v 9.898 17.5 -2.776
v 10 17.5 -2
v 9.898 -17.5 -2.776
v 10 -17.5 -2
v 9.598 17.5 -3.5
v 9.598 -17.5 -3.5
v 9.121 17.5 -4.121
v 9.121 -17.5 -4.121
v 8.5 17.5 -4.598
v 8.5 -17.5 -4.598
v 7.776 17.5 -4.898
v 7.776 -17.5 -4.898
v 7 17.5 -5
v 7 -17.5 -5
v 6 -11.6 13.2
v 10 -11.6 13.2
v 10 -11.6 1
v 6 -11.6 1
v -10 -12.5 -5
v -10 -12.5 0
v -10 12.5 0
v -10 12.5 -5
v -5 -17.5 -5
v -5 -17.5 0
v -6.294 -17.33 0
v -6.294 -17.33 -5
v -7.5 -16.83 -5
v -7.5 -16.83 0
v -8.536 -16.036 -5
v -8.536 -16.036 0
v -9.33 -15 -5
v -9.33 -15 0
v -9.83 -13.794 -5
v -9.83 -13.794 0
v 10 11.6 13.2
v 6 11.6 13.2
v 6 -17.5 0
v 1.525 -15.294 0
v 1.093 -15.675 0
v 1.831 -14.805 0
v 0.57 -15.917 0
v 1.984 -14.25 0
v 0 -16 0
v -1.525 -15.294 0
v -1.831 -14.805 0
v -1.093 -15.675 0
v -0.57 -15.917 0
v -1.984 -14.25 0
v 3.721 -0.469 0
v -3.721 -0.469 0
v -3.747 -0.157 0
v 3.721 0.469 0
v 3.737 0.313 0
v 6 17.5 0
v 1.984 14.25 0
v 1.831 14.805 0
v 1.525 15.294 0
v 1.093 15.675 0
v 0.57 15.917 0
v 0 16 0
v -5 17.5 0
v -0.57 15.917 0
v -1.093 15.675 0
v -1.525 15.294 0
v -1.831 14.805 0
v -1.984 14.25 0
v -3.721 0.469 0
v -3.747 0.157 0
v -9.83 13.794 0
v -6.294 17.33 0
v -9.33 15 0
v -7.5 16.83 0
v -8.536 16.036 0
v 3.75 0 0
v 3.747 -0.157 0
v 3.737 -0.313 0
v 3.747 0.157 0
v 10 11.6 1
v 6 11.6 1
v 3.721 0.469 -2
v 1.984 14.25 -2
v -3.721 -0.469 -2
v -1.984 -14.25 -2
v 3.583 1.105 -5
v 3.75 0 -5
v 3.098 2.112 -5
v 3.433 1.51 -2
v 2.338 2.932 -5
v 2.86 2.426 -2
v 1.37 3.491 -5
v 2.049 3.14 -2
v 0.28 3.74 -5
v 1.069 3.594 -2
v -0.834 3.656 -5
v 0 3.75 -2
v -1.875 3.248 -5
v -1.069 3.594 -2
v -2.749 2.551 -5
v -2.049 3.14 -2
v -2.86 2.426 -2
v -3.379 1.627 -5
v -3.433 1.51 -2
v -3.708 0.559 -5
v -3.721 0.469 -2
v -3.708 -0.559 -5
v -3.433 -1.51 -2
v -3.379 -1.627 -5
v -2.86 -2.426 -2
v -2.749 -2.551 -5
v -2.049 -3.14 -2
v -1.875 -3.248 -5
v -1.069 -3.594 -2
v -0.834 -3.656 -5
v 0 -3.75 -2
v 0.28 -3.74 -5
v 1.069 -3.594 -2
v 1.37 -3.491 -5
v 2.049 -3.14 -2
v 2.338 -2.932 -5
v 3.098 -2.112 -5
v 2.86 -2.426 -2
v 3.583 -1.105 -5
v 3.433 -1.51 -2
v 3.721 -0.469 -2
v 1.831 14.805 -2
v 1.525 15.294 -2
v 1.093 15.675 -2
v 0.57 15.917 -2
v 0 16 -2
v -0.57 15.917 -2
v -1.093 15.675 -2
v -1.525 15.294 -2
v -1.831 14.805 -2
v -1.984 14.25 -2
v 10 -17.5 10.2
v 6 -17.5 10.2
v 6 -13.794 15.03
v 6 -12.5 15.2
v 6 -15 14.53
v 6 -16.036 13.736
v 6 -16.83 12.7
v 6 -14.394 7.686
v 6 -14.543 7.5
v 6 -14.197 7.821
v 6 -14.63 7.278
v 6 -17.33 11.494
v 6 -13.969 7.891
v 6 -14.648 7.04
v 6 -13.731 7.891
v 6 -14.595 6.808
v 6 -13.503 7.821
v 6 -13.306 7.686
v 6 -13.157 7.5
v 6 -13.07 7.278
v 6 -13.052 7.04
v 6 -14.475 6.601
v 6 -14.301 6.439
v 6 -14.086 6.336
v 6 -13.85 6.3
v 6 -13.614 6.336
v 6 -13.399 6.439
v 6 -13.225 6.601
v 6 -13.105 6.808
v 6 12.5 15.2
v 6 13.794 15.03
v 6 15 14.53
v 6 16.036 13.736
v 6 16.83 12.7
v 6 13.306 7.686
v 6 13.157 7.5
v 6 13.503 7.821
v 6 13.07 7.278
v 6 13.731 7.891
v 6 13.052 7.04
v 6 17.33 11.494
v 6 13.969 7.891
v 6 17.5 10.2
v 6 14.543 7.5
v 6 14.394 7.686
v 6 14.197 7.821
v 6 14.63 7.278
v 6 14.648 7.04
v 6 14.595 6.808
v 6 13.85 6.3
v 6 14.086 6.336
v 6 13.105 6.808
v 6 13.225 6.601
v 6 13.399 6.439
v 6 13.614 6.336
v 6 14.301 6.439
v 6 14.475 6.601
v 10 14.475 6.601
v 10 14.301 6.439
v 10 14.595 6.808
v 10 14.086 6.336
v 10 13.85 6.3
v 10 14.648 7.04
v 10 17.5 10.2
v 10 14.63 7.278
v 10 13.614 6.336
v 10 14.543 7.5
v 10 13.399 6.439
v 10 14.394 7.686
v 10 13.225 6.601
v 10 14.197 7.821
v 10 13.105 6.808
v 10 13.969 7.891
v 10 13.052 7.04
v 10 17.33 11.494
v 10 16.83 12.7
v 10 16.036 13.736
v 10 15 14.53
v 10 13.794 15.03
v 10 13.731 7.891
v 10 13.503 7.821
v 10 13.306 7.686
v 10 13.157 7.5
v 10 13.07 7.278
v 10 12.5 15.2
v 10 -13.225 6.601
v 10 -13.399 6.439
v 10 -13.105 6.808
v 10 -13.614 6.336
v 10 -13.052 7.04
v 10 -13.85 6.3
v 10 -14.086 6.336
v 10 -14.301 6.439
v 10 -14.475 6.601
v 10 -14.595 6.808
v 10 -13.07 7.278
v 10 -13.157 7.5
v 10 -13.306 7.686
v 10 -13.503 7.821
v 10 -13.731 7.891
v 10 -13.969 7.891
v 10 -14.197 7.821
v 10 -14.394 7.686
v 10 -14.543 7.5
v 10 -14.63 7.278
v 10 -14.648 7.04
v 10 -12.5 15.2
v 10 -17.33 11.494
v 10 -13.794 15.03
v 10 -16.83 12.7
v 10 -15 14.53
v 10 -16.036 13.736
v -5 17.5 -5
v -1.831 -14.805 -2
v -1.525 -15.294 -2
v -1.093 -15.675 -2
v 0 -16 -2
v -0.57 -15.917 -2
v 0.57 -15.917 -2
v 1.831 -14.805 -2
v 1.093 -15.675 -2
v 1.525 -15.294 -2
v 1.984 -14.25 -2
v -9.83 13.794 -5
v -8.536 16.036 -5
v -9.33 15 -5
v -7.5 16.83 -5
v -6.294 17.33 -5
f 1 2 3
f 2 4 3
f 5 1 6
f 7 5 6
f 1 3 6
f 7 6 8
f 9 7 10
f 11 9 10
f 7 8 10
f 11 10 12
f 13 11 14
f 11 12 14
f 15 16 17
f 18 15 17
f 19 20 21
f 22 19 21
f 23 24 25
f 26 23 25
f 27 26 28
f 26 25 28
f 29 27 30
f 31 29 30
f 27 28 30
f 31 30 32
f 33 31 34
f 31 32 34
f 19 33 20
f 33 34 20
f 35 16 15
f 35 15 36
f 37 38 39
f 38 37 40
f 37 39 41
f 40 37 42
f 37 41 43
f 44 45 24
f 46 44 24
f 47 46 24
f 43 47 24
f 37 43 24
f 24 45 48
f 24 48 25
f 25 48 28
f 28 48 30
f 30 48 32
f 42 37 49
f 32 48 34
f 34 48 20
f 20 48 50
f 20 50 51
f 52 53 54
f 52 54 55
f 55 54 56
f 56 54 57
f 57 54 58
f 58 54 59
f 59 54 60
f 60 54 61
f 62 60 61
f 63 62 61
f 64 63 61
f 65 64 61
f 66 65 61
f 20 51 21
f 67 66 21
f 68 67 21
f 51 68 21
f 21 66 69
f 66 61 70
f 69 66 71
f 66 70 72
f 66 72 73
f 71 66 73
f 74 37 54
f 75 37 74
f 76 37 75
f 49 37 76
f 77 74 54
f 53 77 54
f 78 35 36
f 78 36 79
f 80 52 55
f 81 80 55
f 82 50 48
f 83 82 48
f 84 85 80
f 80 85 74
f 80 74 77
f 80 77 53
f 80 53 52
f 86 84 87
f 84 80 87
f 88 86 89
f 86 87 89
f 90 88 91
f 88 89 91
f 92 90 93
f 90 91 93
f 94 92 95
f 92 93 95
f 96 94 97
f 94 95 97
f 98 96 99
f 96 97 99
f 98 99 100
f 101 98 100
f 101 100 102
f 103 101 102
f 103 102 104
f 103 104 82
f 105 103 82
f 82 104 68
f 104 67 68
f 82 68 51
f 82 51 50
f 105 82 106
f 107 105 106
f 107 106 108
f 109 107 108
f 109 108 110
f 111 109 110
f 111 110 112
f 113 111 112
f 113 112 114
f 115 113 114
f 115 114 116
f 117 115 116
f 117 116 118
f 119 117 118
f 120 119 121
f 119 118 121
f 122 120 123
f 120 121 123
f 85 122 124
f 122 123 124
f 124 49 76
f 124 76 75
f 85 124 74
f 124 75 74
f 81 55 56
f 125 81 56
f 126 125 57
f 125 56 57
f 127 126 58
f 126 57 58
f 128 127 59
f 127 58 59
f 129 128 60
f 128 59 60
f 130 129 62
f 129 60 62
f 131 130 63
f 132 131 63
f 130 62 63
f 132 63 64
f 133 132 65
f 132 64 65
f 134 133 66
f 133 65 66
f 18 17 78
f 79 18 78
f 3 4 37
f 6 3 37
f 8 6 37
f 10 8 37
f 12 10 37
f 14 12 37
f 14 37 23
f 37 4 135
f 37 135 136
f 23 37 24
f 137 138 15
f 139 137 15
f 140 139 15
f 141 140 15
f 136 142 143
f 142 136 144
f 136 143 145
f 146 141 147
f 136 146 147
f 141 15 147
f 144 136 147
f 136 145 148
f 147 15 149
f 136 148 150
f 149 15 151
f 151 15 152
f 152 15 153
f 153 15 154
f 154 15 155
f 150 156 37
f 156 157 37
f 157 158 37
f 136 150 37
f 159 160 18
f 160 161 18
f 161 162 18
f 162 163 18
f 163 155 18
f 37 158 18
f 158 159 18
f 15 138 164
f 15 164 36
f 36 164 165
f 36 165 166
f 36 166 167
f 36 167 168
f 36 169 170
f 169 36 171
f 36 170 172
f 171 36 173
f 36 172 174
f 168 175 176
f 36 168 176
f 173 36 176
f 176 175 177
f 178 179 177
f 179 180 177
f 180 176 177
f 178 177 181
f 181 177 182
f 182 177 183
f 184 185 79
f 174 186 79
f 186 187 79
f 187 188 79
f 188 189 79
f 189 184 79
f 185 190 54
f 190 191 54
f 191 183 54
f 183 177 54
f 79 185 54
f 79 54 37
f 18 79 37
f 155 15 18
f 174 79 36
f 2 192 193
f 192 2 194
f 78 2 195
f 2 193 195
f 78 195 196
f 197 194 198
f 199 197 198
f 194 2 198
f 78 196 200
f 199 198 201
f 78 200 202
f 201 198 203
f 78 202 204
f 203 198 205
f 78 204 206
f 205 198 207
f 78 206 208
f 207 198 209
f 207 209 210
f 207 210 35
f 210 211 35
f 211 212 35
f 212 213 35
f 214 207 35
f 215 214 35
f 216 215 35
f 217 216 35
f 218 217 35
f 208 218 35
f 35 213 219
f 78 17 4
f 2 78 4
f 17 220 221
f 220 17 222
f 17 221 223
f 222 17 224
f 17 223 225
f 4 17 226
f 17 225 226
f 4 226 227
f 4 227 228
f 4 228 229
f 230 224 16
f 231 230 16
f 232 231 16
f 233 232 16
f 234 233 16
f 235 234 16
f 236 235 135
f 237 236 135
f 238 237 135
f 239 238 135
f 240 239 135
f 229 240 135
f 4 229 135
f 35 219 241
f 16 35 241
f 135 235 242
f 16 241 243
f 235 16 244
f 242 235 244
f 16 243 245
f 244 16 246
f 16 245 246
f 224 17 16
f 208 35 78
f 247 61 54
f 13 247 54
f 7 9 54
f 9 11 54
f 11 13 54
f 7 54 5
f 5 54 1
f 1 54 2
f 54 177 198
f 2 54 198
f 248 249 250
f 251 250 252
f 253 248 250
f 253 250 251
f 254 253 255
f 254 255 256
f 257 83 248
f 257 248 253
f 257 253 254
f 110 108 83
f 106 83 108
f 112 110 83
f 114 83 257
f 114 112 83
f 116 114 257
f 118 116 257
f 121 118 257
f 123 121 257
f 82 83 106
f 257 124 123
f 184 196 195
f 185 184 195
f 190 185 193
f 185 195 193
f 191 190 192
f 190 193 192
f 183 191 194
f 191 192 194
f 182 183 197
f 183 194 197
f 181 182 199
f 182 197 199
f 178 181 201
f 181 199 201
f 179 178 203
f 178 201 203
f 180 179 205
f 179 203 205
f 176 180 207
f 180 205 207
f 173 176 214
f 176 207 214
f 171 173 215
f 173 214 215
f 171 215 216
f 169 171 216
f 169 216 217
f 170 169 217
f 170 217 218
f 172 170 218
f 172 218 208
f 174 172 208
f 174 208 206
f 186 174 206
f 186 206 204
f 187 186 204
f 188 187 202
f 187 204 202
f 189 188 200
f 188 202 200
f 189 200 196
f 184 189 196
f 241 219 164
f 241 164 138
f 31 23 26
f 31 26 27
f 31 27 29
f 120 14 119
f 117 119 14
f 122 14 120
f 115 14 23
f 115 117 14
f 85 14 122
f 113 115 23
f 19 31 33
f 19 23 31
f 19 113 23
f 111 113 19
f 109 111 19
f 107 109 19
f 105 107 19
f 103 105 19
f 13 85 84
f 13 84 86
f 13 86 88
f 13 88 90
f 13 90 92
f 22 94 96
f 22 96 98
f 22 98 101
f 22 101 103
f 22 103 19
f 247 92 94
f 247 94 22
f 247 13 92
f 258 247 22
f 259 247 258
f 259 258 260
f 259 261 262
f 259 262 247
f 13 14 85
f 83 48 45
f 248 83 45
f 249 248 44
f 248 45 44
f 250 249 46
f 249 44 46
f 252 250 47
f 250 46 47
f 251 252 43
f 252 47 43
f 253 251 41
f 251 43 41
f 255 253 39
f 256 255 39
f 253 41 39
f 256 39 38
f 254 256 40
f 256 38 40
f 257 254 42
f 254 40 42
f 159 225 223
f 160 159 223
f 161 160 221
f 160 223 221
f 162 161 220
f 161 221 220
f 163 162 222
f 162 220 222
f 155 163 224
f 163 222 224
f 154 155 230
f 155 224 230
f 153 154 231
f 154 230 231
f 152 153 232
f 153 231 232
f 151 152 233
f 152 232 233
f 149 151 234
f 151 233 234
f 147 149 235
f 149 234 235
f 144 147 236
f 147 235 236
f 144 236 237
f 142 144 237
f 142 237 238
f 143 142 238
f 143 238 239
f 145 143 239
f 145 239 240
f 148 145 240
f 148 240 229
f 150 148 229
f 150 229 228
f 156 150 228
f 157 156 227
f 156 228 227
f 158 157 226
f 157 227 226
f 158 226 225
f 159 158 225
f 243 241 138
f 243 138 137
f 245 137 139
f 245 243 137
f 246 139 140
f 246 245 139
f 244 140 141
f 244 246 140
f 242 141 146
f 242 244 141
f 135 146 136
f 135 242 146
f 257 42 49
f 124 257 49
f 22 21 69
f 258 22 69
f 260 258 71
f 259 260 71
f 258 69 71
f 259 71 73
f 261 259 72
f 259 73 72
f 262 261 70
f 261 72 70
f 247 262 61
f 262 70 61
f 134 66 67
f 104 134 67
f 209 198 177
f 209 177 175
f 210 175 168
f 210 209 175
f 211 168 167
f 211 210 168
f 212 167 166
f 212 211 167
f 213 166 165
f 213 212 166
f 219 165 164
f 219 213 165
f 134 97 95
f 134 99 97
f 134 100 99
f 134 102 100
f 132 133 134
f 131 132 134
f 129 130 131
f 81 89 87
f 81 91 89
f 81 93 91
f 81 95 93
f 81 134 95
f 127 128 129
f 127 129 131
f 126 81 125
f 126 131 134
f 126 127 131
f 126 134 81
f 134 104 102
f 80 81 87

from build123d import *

# Parameters (mm, degrees)
SKETCH1_R           = 3.75
BOSS_EXTRUDE1_DEPTH = 5
CUT_EXTRUDE2_DEPTH  = 2
SKETCH5_R           = 0.8
SKETCH5_W           = 12.2
SKETCH5_H           = 23.2
BOSS_EXTRUDE2_DEPTH = 4
FILLET1_R           = 3


with BuildPart() as part:
    # Sketch1 → Boss-Extrude1 (new body)
    with BuildSketch(Plane.XY):
        with BuildLine():
            Line((10, -17.5), (-5, -17.5))
            ThreePointArc((-5, -17.5), (-8.535533906, -16.035533906), (-10, -12.5))
            Line((-10, -12.5), (-10, 12.5))
            ThreePointArc((-10, 12.5), (-8.535533906, 16.035533906), (-5, 17.5))
            Line((-5, 17.5), (10, 17.5))
            Line((10, 17.5), (10, -17.5))
        make_face()
        Circle(SKETCH1_R, mode=Mode.SUBTRACT)
    extrude(amount=-BOSS_EXTRUDE1_DEPTH)

    # Sketch3 → Cut-Extrude2 (cut)
    with BuildSketch(Plane.XY):
        with BuildLine():
            Line((-1.984313483, 14.25), (-3.720587781, 0.46875))
            ThreePointArc((-3.720587781, 0.46875), (-3.75, 0), (-3.720587781, -0.46875))
            Line((-3.720587781, -0.46875), (-1.984313483, -14.25))
            ThreePointArc((-1.984313483, -14.25), (0, -16), (1.984313483, -14.25))
            Line((1.984313483, -14.25), (3.720587781, -0.46875))
            ThreePointArc((3.720587781, -0.46875), (3.75, 0), (3.720587781, 0.46875))
            Line((3.720587781, 0.46875), (1.984313483, 14.25))
            ThreePointArc((1.984313483, 14.25), (0, 16), (-1.984313483, 14.25))
        make_face()
    extrude(amount=-CUT_EXTRUDE2_DEPTH, mode=Mode.SUBTRACT)

    # Sketch5 → Boss-Extrude2 (add)
    with BuildSketch(Plane(origin=(10, 0, 0), x_dir=(0, 0, -1), z_dir=(1, 0, 0))):
        with BuildLine():
            Line((5, 17.5), (-10.2, 17.5))
            ThreePointArc((-10.2, 17.5), (-13.735533906, 16.035533906), (-15.2, 12.5))
            Line((-15.2, 12.5), (-15.2, -12.5))
            ThreePointArc((-15.2, -12.5), (-13.735533906, -16.035533906), (-10.2, -17.5))
            Line((-10.2, -17.5), (5, -17.5))
            Line((5, -17.5), (5, 17.5))
        make_face()
        with Locations((-7.1, 13.85)):
            Circle(SKETCH5_R, mode=Mode.SUBTRACT)
        with Locations((-7.1, -13.85)):
            Circle(SKETCH5_R, mode=Mode.SUBTRACT)
        with Locations((-7.1, 0)):
            Rectangle(SKETCH5_W, SKETCH5_H, mode=Mode.SUBTRACT)
    extrude(amount=-BOSS_EXTRUDE2_DEPTH)

    # Fillet1
    fillet1_edges = [part.edges().sort_by_distance(p)[0] for p in [
        (10, 0, -5),
    ]]
    fillet(fillet1_edges, radius=FILLET1_R)


solid = part.part
